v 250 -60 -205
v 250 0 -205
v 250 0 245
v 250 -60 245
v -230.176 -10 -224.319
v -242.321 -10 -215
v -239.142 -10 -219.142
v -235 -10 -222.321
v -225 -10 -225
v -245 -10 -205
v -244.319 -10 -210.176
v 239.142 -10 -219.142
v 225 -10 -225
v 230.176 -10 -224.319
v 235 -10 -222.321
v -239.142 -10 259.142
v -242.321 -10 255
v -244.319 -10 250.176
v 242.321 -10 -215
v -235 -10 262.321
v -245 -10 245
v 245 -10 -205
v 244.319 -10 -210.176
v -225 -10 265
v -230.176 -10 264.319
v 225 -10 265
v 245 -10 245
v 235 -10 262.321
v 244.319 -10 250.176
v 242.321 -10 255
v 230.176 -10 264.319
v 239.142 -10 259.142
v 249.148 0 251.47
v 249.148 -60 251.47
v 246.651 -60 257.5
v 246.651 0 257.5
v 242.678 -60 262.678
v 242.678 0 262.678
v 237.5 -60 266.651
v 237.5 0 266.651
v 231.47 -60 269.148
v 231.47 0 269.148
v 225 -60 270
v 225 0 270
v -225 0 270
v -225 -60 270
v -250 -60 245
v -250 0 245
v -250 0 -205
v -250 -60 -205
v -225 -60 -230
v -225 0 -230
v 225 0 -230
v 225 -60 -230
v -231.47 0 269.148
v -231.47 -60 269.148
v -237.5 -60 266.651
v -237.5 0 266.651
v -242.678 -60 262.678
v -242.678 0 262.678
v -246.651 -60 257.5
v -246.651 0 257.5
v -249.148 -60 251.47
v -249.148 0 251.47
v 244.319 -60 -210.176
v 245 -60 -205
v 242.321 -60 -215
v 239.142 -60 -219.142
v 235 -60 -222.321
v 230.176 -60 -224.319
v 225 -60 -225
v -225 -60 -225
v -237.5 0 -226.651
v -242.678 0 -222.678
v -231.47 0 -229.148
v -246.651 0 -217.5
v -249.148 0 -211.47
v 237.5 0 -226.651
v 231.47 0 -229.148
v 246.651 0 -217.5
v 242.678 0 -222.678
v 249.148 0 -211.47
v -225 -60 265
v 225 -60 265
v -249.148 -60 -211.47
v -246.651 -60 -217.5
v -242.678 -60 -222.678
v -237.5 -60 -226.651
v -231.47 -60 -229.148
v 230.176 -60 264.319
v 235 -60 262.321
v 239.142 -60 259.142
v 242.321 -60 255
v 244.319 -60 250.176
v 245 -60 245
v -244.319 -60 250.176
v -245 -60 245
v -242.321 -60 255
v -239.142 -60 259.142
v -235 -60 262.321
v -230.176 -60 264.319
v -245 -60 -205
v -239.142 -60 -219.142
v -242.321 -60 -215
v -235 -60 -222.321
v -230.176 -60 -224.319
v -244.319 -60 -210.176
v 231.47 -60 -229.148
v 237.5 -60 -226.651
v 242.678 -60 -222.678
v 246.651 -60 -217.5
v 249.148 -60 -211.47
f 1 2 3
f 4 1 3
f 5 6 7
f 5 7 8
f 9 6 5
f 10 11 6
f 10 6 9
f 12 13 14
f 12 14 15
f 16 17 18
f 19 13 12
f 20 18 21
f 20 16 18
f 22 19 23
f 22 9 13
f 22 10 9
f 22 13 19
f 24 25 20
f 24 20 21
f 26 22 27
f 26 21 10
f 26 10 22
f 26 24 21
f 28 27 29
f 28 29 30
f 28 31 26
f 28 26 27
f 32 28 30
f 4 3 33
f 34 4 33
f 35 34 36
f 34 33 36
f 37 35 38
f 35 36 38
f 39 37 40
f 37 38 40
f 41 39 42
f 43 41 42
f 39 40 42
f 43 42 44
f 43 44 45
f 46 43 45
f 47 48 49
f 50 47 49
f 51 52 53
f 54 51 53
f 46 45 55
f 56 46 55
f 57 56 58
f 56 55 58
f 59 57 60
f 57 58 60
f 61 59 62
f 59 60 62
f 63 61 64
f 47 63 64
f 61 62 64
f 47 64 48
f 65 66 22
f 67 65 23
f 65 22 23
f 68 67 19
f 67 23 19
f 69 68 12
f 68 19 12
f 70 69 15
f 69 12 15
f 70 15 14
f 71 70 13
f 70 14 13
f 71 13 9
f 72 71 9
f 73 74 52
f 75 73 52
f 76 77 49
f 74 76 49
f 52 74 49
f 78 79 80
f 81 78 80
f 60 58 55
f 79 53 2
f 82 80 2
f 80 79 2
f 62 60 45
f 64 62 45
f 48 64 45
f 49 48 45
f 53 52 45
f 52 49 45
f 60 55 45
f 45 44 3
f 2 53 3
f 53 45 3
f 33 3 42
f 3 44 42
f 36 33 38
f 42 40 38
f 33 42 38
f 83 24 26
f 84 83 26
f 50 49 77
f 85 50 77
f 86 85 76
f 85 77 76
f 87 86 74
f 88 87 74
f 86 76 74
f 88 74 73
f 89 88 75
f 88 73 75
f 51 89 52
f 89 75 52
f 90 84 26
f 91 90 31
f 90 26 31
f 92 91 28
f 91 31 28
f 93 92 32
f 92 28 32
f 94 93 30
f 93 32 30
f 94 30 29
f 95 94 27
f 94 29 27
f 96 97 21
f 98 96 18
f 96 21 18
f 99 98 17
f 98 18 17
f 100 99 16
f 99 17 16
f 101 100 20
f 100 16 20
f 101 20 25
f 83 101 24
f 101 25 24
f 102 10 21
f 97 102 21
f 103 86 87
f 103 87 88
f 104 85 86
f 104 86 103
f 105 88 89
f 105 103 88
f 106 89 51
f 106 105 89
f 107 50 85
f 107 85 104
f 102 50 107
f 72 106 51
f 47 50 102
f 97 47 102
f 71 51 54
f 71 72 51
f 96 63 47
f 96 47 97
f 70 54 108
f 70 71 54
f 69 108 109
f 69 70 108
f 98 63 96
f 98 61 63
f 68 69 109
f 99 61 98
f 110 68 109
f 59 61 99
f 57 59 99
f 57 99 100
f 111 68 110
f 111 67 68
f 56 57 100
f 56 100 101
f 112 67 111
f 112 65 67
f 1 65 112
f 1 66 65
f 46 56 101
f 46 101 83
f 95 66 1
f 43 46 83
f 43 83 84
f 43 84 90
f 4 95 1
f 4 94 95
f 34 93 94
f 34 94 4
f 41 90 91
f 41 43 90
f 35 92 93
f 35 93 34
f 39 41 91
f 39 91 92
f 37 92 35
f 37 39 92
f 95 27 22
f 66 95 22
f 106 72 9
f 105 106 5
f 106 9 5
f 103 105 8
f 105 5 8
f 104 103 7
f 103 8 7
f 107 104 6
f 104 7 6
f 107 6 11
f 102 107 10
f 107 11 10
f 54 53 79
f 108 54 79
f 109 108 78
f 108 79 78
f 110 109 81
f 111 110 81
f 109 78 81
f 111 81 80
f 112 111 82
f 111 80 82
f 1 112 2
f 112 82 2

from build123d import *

# Parameters (mm, degrees)
F1_DEPTH = 60
F2_DEPTH = 10


with BuildPart() as f1:
    # F0 (on Front) → F1 (new body)
    with BuildSketch(Plane.XZ):
        with BuildLine():
            Line((250, -205), (250, 20))
            Line((250, 20), (250, 245))
            ThreePointArc((250, 245), (242.67767, 262.67767), (225, 270))
            Line((225, 270), (-225, 270))
            ThreePointArc((-225, 270), (-242.67767, 262.67767), (-250, 245))
            Line((-250, 245), (-250, -205))
            ThreePointArc((-250, -205), (-242.67767, -222.67767), (-225, -230))
            Line((-225, -230), (225, -230))
            ThreePointArc((225, -230), (242.67767, -222.67767), (250, -205))
        make_face()
        with BuildLine():
            Line((245.000005, 20), (245.000005, -205))
            ThreePointArc((245.000005, -205), (239.142139, -219.142139), (225, -225.000005))
            Line((225, -225.000005), (-225, -225.000005))
            ThreePointArc((-225, -225.000005), (-239.142139, -219.142139), (-245.000005, -205))
            Line((-245.000005, -205), (-245.000005, 245))
            ThreePointArc((-245.000005, 245), (-239.142139, 259.142139), (-225, 265.000005))
            Line((-225, 265.000005), (225, 265.000005))
            ThreePointArc((225, 265.000005), (239.142139, 259.142139), (245.000005, 245))
            Line((245.000005, 245), (245.000005, 20))
        make_face(mode=Mode.SUBTRACT)
    extrude(amount=F1_DEPTH)

    # F0 (on Front) → F2 (join)
    with BuildSketch(Plane.XZ):
        with BuildLine():
            ThreePointArc((225, -225.000005), (239.142139, -219.142139), (245.000005, -205))
            Line((245.000005, -205), (245.000005, 20))
            Line((245.000005, 20), (245.000005, 245))
            ThreePointArc((245.000005, 245), (239.142139, 259.142139), (225, 265.000005))
            Line((225, 265.000005), (-225, 265.000005))
            ThreePointArc((-225, 265.000005), (-239.142139, 259.142139), (-245.000005, 245))
            Line((-245.000005, 245), (-245.000005, -205))
            ThreePointArc((-245.000005, -205), (-239.142139, -219.142139), (-225, -225.000005))
            Line((-225, -225.000005), (225, -225.000005))
        make_face()
    extrude(amount=F2_DEPTH)


solid = f1.part
